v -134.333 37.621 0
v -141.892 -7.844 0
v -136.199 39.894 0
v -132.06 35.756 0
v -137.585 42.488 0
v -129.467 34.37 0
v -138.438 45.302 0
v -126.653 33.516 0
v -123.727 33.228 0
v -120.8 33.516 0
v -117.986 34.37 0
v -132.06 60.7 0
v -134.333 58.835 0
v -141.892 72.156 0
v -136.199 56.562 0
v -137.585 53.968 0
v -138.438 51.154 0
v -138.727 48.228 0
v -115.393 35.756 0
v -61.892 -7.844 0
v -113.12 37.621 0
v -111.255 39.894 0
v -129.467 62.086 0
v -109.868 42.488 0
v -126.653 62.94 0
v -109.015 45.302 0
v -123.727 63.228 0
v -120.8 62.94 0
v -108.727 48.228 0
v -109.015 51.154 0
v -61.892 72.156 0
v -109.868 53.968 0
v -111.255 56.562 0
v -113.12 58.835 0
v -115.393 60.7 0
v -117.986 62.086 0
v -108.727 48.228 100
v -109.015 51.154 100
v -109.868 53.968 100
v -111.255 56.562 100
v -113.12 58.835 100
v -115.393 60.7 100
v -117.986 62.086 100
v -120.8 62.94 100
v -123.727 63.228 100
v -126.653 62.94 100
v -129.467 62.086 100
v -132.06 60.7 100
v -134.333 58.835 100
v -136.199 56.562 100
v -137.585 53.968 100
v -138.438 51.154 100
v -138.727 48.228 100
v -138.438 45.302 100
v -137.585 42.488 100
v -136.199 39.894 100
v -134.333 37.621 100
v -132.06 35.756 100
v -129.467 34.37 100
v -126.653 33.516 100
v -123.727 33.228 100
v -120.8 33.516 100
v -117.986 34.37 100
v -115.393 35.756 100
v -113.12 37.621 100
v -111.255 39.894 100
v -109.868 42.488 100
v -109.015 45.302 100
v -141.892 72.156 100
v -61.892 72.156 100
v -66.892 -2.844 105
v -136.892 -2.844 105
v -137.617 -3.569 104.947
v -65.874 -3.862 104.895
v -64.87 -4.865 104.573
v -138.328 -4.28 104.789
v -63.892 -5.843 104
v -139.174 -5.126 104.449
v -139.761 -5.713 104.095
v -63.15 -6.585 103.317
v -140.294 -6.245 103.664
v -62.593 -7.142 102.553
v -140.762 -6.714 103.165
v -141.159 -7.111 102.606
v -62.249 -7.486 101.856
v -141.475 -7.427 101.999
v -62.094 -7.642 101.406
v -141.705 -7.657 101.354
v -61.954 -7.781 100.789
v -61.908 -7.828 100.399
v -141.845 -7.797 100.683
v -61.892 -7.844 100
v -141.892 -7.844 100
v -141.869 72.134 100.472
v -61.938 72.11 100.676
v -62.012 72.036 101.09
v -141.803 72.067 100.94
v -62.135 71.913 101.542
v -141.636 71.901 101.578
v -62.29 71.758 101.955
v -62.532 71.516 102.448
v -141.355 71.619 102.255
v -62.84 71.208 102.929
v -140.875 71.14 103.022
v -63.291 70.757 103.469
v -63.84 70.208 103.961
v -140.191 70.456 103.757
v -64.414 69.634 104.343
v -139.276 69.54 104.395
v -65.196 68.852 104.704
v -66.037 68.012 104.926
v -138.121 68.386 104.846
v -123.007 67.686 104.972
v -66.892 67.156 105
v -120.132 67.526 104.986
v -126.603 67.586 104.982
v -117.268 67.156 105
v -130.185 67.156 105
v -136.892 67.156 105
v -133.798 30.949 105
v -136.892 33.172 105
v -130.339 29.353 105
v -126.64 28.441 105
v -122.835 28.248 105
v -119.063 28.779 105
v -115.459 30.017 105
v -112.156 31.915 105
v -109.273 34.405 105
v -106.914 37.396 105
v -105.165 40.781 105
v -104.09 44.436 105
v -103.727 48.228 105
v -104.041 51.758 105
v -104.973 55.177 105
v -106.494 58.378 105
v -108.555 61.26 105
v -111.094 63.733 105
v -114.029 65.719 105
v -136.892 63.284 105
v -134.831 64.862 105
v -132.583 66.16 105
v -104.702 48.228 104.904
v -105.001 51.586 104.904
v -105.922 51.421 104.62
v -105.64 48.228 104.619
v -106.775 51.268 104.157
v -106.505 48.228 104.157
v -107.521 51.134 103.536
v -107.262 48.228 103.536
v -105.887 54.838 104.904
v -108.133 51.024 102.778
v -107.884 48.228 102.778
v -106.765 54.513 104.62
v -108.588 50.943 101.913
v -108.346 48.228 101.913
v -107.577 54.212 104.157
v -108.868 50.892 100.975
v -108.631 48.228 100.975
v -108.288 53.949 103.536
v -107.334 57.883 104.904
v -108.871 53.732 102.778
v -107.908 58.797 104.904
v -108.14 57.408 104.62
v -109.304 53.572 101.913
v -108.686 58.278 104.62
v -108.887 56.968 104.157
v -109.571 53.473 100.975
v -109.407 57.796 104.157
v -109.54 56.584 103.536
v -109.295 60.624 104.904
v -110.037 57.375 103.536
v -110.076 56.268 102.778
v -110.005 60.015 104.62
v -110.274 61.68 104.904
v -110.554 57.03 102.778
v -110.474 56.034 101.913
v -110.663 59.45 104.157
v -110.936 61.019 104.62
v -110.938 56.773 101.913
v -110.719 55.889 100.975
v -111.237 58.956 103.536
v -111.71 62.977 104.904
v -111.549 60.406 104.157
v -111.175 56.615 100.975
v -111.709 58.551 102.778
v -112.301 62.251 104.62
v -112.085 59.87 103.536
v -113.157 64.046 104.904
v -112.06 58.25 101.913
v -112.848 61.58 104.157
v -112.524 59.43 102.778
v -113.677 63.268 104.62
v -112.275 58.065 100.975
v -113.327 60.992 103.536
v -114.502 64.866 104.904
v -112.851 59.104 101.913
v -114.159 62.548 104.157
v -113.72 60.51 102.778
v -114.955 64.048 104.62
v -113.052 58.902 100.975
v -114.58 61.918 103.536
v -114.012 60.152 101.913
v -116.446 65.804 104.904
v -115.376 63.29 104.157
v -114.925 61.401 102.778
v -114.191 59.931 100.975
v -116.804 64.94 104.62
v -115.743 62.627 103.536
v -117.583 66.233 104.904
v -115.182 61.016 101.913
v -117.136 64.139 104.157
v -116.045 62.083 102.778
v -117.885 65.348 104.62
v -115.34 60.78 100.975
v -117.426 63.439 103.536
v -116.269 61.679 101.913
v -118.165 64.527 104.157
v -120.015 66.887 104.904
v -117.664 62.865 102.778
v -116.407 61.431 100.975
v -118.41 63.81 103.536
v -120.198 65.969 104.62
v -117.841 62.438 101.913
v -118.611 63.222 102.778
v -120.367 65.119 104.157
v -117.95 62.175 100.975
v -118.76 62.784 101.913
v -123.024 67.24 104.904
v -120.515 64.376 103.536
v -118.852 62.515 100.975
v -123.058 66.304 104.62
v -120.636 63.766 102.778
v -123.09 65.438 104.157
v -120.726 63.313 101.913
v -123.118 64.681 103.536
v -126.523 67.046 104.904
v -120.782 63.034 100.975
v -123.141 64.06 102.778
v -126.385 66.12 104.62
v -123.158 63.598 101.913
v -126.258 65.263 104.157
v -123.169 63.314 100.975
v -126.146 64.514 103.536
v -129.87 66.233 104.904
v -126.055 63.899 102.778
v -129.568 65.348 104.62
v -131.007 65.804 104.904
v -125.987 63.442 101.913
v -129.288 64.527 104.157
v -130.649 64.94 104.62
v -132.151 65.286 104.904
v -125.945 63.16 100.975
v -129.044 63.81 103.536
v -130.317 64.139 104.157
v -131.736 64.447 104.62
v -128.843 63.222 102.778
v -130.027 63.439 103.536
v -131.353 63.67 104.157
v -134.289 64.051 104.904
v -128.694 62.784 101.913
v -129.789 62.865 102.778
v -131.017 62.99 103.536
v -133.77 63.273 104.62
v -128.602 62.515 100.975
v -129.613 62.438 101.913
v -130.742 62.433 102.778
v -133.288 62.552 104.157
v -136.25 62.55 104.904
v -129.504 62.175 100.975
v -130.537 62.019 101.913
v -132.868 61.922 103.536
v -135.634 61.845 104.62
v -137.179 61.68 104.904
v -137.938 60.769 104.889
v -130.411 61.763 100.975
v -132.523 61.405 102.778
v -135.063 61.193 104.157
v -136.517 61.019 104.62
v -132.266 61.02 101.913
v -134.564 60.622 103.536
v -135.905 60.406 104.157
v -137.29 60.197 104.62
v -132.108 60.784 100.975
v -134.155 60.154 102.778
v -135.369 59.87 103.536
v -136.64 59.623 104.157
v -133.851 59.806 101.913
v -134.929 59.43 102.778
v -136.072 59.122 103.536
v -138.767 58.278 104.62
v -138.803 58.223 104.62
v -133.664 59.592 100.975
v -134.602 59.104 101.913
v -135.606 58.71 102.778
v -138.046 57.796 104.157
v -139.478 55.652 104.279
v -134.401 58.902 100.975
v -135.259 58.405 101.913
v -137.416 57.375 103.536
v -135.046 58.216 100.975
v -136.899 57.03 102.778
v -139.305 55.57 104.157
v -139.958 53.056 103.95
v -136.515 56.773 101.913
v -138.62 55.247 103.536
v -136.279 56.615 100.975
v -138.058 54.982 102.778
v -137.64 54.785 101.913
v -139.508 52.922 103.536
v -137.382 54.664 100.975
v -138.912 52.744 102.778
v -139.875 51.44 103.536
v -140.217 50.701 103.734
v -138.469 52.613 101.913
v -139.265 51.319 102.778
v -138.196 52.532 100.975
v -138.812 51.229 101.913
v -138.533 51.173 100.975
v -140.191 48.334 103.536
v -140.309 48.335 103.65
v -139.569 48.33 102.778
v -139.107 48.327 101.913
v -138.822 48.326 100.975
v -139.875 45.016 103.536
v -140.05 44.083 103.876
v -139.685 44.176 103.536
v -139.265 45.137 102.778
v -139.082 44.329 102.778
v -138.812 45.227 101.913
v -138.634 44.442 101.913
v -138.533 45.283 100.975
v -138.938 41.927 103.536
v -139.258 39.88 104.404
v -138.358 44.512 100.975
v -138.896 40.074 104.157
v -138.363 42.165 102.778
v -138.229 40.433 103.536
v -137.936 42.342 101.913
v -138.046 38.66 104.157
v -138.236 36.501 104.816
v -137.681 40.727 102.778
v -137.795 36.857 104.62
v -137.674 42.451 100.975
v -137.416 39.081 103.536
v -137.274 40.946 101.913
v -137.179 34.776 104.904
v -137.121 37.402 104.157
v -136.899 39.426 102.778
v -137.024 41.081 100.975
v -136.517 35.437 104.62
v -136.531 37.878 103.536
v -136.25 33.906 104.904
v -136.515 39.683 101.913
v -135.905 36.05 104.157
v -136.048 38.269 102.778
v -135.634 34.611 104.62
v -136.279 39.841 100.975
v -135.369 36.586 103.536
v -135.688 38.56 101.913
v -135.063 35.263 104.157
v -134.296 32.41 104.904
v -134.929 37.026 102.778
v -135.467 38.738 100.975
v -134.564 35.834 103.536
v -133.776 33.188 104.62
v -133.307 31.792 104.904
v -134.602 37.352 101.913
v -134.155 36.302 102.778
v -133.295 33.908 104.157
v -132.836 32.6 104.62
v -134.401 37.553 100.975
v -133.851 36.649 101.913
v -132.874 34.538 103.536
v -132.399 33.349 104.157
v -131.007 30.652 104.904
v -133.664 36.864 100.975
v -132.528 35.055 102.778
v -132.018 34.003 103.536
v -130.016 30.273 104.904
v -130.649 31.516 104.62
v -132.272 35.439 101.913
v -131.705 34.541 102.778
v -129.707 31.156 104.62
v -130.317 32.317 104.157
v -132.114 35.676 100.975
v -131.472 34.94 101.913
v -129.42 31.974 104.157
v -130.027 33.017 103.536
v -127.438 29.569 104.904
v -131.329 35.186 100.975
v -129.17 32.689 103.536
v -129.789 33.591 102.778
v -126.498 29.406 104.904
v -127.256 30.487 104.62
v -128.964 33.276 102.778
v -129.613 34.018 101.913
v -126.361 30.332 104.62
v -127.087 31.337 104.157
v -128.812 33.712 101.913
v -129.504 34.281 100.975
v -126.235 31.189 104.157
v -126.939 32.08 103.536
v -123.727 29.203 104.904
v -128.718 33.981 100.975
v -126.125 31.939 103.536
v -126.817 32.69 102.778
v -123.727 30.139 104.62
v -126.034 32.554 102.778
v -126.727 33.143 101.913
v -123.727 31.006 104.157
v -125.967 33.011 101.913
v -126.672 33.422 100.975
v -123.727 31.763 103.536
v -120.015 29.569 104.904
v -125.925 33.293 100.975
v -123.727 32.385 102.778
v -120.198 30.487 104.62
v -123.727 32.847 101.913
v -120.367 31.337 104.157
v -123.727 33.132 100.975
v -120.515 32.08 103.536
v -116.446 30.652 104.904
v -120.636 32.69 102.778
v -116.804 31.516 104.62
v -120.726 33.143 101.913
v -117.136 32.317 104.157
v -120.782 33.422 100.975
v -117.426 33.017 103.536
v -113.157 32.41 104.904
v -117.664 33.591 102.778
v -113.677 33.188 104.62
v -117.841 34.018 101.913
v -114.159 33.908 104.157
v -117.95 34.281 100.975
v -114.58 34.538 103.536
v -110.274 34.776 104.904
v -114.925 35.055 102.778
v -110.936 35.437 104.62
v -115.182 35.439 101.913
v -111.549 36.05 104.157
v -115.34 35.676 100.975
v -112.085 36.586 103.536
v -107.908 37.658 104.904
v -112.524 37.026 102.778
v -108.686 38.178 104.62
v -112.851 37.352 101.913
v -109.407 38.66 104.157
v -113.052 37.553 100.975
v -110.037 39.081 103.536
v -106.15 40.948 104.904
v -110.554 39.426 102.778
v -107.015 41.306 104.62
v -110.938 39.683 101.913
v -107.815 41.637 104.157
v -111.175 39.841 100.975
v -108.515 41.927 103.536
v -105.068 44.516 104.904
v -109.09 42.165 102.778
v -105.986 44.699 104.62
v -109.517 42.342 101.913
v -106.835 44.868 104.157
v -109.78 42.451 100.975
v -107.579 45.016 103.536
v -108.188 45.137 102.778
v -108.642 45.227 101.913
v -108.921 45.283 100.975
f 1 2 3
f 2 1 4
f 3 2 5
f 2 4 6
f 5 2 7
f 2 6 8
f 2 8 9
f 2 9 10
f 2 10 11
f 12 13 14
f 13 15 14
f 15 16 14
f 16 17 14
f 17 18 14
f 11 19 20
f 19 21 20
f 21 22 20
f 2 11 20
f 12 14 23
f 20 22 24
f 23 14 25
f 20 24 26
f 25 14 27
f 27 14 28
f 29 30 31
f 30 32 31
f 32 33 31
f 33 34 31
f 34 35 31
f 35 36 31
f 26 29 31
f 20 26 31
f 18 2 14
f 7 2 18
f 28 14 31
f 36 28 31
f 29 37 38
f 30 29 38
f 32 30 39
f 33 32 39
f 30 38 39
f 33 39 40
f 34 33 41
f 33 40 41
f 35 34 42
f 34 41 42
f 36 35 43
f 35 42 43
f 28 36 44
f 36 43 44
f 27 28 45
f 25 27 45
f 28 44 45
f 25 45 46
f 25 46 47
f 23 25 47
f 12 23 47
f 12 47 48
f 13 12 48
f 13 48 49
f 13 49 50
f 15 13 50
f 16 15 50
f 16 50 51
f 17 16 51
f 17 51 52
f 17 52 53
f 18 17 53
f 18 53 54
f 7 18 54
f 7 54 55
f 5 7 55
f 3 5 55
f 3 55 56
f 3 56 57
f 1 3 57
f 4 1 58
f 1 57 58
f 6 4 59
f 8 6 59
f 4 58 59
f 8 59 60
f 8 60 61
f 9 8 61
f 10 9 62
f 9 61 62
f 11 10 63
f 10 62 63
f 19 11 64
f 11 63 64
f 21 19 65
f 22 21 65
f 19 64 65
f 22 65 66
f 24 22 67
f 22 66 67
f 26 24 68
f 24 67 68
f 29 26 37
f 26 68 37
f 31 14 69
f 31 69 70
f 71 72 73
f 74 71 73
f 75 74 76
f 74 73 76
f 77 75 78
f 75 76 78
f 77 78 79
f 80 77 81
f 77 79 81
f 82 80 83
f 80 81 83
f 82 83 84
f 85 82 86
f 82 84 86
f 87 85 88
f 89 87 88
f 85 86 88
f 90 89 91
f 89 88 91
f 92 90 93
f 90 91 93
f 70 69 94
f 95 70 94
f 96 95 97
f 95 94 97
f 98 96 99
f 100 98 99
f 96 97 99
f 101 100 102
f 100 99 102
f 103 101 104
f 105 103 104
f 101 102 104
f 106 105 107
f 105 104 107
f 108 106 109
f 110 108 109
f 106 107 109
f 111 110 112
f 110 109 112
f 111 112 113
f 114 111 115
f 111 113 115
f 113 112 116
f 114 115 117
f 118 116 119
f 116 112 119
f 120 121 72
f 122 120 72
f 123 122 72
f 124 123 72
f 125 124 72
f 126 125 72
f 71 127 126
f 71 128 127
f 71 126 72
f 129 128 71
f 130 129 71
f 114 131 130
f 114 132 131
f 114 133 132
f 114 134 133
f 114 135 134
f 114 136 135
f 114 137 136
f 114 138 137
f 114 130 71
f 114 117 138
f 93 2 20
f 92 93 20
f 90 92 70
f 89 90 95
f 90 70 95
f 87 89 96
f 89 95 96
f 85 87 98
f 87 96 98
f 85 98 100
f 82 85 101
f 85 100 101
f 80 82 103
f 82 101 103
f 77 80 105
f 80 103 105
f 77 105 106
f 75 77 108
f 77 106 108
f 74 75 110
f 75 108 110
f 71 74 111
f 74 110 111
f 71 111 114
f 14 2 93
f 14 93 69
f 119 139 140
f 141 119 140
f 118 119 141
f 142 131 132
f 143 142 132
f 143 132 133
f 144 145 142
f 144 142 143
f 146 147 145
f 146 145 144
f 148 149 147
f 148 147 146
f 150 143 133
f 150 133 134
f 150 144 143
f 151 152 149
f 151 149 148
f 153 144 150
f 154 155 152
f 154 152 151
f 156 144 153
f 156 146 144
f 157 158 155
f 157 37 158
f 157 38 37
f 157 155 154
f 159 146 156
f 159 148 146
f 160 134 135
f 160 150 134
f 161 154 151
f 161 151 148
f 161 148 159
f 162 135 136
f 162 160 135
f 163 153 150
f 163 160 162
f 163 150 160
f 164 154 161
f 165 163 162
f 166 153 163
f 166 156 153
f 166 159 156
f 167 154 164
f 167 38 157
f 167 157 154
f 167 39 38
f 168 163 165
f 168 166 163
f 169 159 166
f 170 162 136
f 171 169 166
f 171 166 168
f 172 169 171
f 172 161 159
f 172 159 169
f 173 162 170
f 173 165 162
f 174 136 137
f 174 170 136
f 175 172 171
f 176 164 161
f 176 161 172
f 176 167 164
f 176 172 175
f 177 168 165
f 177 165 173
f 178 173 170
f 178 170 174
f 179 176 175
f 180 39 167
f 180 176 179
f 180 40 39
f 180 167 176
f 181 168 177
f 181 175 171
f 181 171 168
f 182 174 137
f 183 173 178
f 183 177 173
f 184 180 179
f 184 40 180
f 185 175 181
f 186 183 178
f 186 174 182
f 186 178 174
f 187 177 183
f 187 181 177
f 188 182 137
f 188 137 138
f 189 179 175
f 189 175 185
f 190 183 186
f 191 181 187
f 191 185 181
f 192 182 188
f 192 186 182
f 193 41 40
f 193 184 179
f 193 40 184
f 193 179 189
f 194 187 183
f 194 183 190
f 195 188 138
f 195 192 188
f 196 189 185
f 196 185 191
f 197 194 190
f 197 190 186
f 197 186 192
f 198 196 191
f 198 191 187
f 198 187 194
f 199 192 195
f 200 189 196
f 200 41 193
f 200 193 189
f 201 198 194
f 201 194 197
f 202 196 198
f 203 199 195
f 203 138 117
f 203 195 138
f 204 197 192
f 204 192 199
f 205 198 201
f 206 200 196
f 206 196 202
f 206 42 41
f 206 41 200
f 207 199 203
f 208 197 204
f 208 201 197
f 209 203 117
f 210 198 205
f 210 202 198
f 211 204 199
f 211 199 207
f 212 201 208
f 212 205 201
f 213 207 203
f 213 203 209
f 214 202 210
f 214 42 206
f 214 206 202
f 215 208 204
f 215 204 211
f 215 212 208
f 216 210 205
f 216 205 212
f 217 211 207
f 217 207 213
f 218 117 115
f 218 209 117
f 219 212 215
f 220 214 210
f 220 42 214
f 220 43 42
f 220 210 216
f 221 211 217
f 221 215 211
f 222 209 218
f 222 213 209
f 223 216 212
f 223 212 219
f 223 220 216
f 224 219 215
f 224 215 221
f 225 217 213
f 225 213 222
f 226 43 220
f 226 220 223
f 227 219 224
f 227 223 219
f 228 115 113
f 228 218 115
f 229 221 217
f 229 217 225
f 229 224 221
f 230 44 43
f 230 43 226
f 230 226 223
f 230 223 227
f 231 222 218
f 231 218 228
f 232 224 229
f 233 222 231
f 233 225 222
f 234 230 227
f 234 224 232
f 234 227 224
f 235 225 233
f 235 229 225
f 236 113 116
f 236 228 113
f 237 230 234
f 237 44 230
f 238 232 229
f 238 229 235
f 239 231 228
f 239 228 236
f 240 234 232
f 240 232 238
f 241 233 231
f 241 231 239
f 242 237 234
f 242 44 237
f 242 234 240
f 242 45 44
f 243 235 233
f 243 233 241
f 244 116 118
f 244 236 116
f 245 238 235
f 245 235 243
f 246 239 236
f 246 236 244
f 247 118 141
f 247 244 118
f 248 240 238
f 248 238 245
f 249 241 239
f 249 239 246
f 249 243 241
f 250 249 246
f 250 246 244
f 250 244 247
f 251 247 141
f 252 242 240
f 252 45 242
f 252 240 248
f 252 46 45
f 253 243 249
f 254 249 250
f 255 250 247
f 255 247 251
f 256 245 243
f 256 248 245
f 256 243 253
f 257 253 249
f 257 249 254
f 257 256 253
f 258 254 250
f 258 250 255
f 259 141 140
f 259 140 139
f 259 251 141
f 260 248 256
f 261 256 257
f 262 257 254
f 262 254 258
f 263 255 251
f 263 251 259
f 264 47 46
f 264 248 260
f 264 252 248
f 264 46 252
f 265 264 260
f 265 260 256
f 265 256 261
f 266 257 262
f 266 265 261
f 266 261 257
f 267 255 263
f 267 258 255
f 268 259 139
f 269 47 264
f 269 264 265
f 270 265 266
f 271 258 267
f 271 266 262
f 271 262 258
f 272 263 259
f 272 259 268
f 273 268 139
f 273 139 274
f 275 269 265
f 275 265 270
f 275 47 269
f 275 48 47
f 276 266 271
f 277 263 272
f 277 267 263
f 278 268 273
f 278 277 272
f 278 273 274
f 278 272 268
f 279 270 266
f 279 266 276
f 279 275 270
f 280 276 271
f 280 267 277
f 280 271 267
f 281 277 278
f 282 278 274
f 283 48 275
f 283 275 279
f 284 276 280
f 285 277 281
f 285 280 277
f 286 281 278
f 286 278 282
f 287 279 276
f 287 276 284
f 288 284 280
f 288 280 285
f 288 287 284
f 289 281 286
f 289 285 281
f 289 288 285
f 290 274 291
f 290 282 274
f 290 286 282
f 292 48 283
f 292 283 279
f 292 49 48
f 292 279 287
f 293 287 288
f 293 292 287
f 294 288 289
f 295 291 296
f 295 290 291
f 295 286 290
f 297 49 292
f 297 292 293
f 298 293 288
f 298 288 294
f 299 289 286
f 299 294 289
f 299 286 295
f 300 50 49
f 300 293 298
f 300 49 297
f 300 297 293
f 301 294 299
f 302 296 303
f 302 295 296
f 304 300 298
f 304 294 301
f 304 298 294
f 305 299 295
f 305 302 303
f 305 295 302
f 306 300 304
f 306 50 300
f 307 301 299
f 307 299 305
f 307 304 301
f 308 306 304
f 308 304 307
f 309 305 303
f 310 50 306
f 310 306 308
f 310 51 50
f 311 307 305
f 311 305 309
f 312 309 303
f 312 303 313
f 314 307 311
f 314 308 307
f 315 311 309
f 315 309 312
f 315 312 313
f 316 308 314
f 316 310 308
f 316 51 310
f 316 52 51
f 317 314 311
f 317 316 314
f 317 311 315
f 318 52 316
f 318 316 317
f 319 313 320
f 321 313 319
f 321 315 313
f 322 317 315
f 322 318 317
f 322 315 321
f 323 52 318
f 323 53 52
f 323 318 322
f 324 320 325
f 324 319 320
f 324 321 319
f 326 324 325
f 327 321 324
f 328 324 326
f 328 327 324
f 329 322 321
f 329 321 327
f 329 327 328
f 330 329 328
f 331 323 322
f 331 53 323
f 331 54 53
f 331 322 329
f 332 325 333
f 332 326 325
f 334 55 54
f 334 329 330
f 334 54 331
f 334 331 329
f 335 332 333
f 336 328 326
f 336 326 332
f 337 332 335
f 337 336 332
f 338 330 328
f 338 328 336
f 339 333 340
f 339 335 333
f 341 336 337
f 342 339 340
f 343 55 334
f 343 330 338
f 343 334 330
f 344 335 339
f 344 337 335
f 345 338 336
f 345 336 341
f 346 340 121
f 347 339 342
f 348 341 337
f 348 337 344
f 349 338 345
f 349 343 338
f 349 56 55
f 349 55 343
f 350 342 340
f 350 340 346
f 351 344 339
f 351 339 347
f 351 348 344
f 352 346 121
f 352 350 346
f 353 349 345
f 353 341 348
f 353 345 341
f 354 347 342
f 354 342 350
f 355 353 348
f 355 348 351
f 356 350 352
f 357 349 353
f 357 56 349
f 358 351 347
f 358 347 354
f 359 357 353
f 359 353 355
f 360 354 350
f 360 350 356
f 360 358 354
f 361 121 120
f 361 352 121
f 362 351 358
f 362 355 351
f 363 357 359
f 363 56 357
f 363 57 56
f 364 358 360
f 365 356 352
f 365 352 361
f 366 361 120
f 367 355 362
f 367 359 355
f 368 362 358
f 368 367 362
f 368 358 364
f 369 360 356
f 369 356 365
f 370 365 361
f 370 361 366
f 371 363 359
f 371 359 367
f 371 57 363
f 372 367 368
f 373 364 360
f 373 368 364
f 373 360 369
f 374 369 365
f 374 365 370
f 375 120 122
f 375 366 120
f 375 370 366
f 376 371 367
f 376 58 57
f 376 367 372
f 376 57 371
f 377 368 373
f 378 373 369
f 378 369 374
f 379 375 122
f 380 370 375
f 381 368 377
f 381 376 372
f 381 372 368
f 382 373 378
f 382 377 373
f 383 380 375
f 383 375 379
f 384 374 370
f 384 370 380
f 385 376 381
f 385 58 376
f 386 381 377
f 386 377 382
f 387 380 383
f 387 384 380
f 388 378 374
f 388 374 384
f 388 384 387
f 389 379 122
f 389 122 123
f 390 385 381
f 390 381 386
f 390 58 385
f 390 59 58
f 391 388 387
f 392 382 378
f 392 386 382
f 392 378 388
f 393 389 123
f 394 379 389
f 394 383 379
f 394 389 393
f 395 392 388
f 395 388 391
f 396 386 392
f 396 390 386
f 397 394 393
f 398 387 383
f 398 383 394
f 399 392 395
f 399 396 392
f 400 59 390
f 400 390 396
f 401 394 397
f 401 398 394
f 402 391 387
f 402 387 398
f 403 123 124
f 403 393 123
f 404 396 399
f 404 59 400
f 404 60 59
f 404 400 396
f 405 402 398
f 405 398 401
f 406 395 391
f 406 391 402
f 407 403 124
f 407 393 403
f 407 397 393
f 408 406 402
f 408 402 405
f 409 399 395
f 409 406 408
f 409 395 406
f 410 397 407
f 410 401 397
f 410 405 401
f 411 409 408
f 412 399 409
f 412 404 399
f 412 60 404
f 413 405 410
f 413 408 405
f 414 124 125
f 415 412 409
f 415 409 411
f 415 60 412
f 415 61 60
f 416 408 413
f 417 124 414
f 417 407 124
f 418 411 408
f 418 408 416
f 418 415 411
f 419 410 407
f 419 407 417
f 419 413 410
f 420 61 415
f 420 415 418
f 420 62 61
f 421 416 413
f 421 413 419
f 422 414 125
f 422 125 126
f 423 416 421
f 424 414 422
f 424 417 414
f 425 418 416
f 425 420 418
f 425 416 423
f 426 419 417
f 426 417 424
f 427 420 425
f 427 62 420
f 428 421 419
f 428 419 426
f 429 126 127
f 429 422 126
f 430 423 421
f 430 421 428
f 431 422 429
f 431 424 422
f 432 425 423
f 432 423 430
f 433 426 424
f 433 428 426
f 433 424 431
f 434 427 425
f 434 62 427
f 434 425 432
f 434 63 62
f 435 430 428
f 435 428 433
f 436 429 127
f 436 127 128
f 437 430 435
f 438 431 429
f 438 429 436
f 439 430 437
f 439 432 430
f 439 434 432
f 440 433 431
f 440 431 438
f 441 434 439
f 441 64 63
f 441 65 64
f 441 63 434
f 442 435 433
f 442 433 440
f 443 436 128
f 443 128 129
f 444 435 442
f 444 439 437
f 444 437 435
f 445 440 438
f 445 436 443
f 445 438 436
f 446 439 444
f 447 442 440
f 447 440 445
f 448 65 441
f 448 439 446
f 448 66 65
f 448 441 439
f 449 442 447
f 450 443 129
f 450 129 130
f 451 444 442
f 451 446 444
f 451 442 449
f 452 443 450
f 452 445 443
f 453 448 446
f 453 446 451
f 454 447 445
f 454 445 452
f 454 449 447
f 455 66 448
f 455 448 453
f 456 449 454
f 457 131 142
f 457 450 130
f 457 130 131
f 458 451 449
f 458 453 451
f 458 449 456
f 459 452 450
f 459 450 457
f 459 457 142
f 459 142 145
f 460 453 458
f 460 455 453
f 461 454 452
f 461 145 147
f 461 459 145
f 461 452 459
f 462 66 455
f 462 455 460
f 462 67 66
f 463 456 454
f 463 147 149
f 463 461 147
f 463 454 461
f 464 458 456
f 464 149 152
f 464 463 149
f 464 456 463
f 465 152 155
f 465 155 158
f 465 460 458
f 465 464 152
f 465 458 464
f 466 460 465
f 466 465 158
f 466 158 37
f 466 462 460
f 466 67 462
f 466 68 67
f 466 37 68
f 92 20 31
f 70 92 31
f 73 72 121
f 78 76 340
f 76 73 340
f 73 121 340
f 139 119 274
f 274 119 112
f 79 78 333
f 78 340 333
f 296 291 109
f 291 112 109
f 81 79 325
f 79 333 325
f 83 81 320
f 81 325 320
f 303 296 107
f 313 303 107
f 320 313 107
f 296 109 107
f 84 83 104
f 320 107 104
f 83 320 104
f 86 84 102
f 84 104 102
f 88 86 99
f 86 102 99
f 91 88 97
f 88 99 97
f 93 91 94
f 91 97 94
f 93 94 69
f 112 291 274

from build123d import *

# Parameters (mm, degrees)
F0_W        = 80
F0_H        = 80
F1_DEPTH    = 80
F2_DEPTH    = 25
F3_R        = 15
F4_DEPTH    = 105.001
F5_T1_DEPTH = 105
F5_T3_DEPTH = 105


# Not quite as in the source:
# - a fillet or chamfer that OpenCascade refuses, or shapes differently, is made with other operations: its cross-section is extruded or revolved along the edge and cut away or added


with BuildPart() as f1:
    # F0 (on Top) → F1 (new body)
    with BuildSketch(Plane.XY):
        with Locations((-101.8917422961, 32.1563994512)):
            Rectangle(F0_W, F0_H)
    extrude(amount=F1_DEPTH)

    # F2 (add): a face of the model
    f2_faces = [f1.faces().sort_by_distance(p)[0] for p in [
        (-101.8917422961, 32.1563994512, 80),
    ]]
    extrude(f2_faces, amount=F2_DEPTH)

    # F3 (on face) → F4 (cut, through all)
    with BuildSketch(Plane.XY.offset(105)):
        with Locations((-123.7266734242, 48.2279583812)):
            Circle(F3_R)
    extrude(amount=-F4_DEPTH, mode=Mode.SUBTRACT)

    # F5: fillet of radius 5 on 5 edges, made by hand

    # F5_s2 → F5_t1 (cut)
    with BuildSketch(Plane.YZ.offset(-154.3917422961)):
        with BuildLine():
            ThreePointArc((72.1563994512, 100), (70.6919333571, 103.5355339059), (67.1563994512, 105))
            Line((67.1563994512, 105), (72.1563994512, 105))
            Line((72.1563994512, 105), (72.1563994512, 100))
        make_face()
        with BuildLine():
            ThreePointArc((-2.8436005488, 105), (-6.3791344547, 103.5355339059), (-7.8436005488, 100))
            Line((-7.8436005488, 100), (-7.8436005488, 105))
            Line((-7.8436005488, 105), (-2.8436005488, 105))
        make_face()
    extrude(amount=F5_T1_DEPTH, mode=Mode.SUBTRACT)

    # F5_s4 → F5_t3 (cut)
    with BuildSketch(Plane.XZ.offset(-84.6563994512)):
        with BuildLine():
            ThreePointArc((-61.8917422961, 100), (-63.3562083901, 103.5355339059), (-66.8917422961, 105))
            Line((-66.8917422961, 105), (-61.8917422961, 105))
            Line((-61.8917422961, 105), (-61.8917422961, 100))
        make_face()
        with BuildLine():
            ThreePointArc((-136.8917422961, 105), (-140.427276202, 103.5355339059), (-141.8917422961, 100))
            Line((-141.8917422961, 100), (-141.8917422961, 105))
            Line((-141.8917422961, 105), (-136.8917422961, 105))
        make_face()
    extrude(amount=F5_T3_DEPTH, mode=Mode.SUBTRACT)

    # F5_s5 → F5_t6 (revolve, cut)
    with BuildSketch(Plane.XZ.offset(-48.2279583812)):
        with BuildLine():
            ThreePointArc((-103.7266734242, 105), (-107.2622073302, 103.5355339059), (-108.7266734242, 100))
            Line((-108.7266734242, 100), (-108.7266734242, 105))
            Line((-108.7266734242, 105), (-103.7266734242, 105))
        make_face()
    revolve(axis=Axis((-123.7266734242, 48.2279583812, 105), (0, 0, 1)), mode=Mode.SUBTRACT)


solid = f1.part
